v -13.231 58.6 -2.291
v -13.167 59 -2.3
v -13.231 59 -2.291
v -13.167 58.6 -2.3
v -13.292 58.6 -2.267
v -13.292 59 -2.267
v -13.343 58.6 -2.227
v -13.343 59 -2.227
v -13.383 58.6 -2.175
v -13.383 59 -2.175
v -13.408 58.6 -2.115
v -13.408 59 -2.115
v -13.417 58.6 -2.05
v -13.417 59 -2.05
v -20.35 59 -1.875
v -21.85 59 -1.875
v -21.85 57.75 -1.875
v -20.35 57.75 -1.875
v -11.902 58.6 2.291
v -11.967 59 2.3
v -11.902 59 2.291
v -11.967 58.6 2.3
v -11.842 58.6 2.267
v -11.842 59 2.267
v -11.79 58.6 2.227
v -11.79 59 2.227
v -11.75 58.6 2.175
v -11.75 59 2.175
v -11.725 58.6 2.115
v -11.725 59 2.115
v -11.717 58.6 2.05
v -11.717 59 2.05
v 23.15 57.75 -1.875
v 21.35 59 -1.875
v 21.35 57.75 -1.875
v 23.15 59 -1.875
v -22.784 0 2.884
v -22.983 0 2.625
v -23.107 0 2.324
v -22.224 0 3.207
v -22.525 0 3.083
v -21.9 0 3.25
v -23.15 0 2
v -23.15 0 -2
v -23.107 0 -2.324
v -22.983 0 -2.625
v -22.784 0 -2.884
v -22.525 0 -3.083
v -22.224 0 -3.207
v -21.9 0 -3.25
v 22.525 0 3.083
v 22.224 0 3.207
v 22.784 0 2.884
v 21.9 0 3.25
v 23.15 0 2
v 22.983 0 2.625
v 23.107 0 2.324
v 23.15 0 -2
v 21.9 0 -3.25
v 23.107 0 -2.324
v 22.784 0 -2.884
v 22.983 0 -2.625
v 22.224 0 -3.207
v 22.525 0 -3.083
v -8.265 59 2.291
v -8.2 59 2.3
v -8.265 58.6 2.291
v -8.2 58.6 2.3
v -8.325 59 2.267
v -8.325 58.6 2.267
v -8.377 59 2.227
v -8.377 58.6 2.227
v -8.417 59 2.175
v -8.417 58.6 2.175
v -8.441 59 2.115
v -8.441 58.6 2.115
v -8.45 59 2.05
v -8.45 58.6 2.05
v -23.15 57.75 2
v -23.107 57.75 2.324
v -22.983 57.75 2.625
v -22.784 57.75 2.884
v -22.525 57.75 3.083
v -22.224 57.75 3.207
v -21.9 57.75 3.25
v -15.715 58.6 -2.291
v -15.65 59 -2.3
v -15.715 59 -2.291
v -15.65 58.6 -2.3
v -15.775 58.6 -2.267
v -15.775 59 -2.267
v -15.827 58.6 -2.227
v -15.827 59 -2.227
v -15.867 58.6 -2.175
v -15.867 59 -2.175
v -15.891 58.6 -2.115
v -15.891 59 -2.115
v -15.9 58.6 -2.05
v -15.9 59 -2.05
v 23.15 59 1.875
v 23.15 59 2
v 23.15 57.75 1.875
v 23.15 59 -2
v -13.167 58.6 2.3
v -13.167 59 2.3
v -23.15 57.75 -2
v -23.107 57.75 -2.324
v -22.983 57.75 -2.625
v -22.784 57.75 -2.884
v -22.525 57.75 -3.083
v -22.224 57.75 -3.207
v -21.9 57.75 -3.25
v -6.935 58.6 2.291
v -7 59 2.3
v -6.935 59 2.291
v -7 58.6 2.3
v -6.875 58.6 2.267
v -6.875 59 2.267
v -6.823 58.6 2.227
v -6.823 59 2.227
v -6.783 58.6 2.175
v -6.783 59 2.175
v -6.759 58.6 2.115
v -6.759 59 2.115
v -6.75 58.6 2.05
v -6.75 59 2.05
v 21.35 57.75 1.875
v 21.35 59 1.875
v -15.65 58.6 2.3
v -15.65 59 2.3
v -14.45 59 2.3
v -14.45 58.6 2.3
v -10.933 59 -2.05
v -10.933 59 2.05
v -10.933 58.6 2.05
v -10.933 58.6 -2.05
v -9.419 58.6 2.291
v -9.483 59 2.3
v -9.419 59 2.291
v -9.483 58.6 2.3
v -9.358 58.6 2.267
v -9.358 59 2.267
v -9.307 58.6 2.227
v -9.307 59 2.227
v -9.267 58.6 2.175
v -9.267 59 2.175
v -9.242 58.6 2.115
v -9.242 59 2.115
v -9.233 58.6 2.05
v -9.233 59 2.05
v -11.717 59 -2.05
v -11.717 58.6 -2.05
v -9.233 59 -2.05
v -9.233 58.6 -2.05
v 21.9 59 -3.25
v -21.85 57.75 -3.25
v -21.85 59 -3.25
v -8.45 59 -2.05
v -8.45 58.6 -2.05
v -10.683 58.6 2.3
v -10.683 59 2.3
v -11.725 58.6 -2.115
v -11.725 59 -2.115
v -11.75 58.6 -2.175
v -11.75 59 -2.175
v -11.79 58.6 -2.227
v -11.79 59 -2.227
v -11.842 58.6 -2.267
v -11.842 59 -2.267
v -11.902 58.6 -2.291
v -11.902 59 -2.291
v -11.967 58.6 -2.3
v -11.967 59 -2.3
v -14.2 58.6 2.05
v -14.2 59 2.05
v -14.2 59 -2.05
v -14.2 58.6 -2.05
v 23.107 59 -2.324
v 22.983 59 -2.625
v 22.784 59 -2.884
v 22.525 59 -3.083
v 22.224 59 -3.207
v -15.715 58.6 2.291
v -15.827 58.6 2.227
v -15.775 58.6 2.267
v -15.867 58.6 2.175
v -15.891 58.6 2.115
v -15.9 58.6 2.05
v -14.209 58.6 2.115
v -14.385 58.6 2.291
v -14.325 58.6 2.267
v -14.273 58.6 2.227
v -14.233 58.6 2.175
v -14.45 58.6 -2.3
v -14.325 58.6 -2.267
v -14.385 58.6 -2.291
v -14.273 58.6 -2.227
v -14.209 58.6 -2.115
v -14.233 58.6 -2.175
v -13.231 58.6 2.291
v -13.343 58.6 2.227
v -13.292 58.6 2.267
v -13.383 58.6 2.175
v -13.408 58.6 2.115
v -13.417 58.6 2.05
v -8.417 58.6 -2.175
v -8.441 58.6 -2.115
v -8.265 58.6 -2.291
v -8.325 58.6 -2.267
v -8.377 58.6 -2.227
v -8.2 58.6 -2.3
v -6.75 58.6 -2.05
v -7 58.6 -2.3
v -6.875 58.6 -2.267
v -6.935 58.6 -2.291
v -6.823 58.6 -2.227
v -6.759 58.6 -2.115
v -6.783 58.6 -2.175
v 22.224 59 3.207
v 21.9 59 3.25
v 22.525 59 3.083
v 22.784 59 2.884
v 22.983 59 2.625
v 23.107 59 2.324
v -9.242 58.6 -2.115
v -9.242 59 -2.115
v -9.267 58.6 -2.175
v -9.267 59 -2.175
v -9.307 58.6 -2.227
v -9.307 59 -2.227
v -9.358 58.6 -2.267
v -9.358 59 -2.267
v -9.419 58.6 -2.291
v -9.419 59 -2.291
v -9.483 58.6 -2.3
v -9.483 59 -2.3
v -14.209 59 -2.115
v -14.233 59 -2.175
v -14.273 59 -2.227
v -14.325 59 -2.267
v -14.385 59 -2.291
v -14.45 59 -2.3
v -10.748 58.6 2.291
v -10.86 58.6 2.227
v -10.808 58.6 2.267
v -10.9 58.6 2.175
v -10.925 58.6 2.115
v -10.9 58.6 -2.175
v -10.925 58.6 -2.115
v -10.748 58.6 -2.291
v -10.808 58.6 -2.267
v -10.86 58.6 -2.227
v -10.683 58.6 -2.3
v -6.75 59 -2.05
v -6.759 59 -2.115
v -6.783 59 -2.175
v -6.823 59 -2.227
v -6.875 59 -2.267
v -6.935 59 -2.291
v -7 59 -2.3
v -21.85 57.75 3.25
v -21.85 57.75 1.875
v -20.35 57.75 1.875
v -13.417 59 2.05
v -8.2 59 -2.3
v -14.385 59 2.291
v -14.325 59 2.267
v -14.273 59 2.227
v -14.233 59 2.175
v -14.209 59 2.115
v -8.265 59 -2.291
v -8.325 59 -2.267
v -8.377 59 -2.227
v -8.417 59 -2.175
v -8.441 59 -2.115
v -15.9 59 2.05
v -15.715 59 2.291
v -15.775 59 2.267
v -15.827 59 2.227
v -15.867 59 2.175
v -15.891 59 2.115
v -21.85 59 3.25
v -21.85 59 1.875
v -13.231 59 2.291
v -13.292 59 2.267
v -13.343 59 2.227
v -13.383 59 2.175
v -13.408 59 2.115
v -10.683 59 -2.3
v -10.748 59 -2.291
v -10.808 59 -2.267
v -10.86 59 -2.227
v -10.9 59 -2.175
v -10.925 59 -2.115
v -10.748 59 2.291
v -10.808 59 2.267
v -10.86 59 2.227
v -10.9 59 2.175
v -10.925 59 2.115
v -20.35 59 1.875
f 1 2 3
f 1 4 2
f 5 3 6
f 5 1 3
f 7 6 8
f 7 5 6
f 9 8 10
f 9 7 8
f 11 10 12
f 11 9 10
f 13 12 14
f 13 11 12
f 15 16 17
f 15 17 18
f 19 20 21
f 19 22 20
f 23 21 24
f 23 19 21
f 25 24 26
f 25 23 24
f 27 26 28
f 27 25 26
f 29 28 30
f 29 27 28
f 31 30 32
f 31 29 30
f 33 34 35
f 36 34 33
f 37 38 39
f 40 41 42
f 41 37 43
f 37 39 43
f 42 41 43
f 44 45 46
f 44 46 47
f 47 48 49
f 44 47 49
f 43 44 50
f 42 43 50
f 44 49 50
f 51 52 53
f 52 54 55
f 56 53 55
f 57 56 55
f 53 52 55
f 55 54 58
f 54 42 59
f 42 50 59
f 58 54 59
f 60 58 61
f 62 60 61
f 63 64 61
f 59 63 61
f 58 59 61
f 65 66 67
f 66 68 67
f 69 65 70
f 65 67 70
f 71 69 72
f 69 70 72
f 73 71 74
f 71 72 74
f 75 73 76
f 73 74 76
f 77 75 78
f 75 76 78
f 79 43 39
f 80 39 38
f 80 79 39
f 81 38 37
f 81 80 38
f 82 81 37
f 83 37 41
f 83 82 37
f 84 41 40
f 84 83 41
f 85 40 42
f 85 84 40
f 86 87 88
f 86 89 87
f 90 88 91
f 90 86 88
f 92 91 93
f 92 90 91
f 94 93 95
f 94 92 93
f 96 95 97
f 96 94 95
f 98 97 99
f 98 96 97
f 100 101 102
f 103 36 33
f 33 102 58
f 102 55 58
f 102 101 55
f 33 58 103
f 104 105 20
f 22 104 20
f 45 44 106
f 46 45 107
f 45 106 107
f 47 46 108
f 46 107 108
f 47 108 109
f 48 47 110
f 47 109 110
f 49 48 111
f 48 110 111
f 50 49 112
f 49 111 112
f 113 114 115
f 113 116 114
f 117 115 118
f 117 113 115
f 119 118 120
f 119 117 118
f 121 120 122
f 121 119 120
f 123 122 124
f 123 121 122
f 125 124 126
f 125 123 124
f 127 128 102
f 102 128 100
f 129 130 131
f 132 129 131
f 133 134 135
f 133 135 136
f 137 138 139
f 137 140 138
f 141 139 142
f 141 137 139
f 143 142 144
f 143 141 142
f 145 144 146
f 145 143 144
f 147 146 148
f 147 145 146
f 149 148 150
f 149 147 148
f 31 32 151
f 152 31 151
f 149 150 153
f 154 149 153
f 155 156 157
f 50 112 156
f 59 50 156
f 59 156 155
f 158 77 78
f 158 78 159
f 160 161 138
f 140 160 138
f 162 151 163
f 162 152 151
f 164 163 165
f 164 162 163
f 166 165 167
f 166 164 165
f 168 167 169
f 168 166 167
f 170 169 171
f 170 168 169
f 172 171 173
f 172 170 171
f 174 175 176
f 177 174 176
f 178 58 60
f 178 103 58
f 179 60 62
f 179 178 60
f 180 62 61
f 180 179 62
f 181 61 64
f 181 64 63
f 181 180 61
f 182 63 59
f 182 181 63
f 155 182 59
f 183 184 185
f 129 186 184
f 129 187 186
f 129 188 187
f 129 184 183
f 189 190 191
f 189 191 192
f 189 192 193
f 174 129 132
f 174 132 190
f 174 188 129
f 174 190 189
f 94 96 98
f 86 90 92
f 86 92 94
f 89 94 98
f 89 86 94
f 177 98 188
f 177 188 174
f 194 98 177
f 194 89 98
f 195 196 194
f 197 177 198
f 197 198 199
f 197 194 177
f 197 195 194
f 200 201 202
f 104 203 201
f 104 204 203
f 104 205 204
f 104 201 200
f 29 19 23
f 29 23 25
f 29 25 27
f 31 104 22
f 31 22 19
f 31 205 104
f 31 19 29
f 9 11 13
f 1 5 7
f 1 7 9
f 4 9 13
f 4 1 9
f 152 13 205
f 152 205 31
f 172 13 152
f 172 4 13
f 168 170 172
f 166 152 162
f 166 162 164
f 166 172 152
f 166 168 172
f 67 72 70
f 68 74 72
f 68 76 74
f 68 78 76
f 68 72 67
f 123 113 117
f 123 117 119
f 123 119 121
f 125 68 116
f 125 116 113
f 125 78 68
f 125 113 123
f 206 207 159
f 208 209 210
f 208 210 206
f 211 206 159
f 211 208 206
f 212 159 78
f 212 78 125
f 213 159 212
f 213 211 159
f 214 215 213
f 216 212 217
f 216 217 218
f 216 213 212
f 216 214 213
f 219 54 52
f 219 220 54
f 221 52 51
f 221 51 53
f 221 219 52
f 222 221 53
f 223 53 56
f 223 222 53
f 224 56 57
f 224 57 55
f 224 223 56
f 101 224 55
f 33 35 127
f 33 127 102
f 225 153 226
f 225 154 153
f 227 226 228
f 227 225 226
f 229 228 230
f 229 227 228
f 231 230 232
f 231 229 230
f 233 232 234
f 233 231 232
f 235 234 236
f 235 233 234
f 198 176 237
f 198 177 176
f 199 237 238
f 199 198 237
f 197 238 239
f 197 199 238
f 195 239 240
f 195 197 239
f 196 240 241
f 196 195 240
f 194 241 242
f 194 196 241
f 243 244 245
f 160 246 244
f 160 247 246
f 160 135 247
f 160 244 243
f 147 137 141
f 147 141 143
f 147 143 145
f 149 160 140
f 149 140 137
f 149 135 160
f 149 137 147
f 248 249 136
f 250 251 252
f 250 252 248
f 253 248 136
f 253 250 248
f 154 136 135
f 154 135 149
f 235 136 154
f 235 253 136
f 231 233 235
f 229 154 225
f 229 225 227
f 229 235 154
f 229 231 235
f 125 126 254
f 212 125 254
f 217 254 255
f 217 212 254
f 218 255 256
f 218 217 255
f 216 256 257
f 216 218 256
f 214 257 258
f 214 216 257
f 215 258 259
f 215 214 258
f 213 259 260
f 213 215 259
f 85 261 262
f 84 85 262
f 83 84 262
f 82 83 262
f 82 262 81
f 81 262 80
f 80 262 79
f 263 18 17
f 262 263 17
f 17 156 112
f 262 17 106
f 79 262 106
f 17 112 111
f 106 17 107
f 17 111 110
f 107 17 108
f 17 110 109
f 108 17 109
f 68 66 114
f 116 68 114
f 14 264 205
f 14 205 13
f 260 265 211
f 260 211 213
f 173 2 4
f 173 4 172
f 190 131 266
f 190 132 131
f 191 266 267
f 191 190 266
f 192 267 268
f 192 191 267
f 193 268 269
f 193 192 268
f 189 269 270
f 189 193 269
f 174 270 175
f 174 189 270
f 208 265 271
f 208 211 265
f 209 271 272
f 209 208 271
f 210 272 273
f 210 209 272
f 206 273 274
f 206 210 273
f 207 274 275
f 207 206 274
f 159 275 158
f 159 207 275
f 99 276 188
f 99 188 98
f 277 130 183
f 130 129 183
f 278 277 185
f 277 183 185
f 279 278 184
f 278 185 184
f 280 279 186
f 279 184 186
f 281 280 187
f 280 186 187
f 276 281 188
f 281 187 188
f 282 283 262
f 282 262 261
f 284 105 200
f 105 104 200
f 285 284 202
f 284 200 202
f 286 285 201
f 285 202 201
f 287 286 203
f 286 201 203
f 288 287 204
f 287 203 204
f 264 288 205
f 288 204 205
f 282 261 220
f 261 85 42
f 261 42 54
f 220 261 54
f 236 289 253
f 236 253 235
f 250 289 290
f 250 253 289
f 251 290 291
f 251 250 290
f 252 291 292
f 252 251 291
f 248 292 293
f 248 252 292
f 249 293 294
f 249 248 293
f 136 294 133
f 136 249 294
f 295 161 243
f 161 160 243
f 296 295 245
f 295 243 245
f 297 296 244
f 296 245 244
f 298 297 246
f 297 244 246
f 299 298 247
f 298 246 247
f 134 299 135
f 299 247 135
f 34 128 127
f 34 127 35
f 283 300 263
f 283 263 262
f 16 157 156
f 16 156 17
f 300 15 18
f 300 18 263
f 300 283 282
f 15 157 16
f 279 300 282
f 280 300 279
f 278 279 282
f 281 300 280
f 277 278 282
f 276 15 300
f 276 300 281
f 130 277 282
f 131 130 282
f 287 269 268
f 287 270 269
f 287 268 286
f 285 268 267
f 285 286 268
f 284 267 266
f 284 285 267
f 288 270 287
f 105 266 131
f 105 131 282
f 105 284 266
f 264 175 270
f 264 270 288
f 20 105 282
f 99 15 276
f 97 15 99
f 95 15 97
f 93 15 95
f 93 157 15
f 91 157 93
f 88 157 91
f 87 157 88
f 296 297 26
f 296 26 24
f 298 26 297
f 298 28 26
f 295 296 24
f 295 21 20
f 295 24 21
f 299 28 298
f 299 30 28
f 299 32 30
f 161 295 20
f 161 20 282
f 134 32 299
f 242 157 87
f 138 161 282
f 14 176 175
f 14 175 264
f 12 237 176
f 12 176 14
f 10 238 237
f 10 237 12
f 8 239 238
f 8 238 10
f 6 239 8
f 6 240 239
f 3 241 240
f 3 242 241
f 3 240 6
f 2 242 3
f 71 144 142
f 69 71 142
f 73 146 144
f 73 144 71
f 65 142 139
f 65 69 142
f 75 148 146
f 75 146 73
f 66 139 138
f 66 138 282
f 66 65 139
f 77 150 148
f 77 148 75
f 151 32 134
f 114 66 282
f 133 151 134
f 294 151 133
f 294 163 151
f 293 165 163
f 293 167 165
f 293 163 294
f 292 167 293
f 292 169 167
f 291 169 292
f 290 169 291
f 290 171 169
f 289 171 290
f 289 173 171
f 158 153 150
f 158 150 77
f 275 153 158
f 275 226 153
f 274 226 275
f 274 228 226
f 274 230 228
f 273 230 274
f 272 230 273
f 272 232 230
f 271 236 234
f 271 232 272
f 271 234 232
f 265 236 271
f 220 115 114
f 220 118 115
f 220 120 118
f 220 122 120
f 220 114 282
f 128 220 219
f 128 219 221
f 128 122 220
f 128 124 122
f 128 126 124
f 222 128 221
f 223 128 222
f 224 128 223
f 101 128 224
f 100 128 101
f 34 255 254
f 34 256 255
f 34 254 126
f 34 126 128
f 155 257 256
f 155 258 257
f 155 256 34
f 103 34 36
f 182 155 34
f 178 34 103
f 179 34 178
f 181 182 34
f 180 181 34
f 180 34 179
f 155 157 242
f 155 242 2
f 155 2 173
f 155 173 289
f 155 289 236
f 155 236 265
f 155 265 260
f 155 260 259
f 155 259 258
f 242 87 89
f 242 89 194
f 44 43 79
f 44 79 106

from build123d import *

# Parameters (mm, degrees)
SKETCH1_W           = 46.3
SKETCH1_H           = 6.5
BOSS_EXTRUDE1_DEPTH = 59
FILLET1_R           = 1.25
SKETCH2_W           = 1.8
SKETCH2_H           = 3.75
CUT_EXTRUDE1_DEPTH  = 1.25
SKETCH3_W           = 1.7
SKETCH3_H           = 4.6
CUT_EXTRUDE2_DEPTH  = 0.4
FILLET2_R           = 0.25


with BuildPart() as part:
    # Sketch1 → Boss-Extrude1 (new body)
    with BuildSketch(Plane(origin=(0, 0, 0), x_dir=(1, 0, 0), z_dir=(0, 1, 0))):
        Rectangle(SKETCH1_W, SKETCH1_H)
    extrude(amount=BOSS_EXTRUDE1_DEPTH)

    # Fillet1
    fillet1_edges = [part.edges().sort_by_distance(p)[0] for p in [
        (23.15, 29.5, 3.25),
        (-23.15, 29.5, 3.25),
        (-23.15, 29.5, -3.25),
        (23.15, 29.5, -3.25),
    ]]
    fillet(fillet1_edges, radius=FILLET1_R)

    # Sketch2 → Cut-Extrude1 (cut)
    with BuildSketch(Plane(origin=(0, 59, 0), x_dir=(1, 0, 0), z_dir=(0, 1, 0))):
        with Locations((22.25, 0)):
            Rectangle(SKETCH2_W, SKETCH2_H)
        with BuildLine():
            Line((-21.85, 3.25), (-21.85, 1.875))
            Line((-21.85, 1.875), (-20.35, 1.875))
            Line((-20.35, 1.875), (-20.35, 0))
            Line((-20.35, 0), (-20.35, -1.875))
            Line((-20.35, -1.875), (-21.85, -1.875))
            Line((-21.85, -1.875), (-21.85, -3.25))
            Line((-21.85, -3.25), (-21.9, -3.25))
            ThreePointArc((-21.9, -3.25), (-22.783883476, -2.883883476), (-23.15, -2))
            Line((-23.15, -2), (-23.15, 2))
            ThreePointArc((-23.15, 2), (-22.783883476, 2.883883476), (-21.9, 3.25))
            Line((-21.9, 3.25), (-21.85, 3.25))
        make_face()
    extrude(amount=-CUT_EXTRUDE1_DEPTH, mode=Mode.SUBTRACT)

    # Sketch3 → Cut-Extrude2 (cut)
    with BuildSketch(Plane(origin=(0, 59, 0), x_dir=(1, 0, 0), z_dir=(0, 1, 0))):
        with Locations((-15.05, 0)):
            Rectangle(SKETCH3_W, SKETCH3_H)
        with Locations((-12.566666667, 0)):
            Rectangle(SKETCH3_W, SKETCH3_H)
        with Locations((-10.083333333, 0)):
            Rectangle(SKETCH3_W, SKETCH3_H)
        with Locations((-7.6, 0)):
            Rectangle(SKETCH3_W, SKETCH3_H)
    extrude(amount=-CUT_EXTRUDE2_DEPTH, mode=Mode.SUBTRACT)

    # Fillet2
    fillet2_edges = [part.edges().sort_by_distance(p)[0] for p in [
        (-13.416666667, 58.8, -2.3),
        (-11.716666667, 58.8, -2.3),
        (-11.716666667, 58.8, 2.3),
        (-13.416666667, 58.8, 2.3),
        (-10.933333333, 58.8, -2.3),
        (-9.233333333, 58.8, -2.3),
        (-9.233333333, 58.8, 2.3),
        (-10.933333333, 58.8, 2.3),
        (-8.45, 58.8, -2.3),
        (-6.75, 58.8, -2.3),
        (-6.75, 58.8, 2.3),
        (-8.45, 58.8, 2.3),
        (-14.2, 58.8, -2.3),
        (-14.2, 58.8, 2.3),
        (-15.9, 58.8, 2.3),
        (-15.9, 58.8, -2.3),
    ]]
    fillet(fillet2_edges, radius=FILLET2_R)


solid = part.part
